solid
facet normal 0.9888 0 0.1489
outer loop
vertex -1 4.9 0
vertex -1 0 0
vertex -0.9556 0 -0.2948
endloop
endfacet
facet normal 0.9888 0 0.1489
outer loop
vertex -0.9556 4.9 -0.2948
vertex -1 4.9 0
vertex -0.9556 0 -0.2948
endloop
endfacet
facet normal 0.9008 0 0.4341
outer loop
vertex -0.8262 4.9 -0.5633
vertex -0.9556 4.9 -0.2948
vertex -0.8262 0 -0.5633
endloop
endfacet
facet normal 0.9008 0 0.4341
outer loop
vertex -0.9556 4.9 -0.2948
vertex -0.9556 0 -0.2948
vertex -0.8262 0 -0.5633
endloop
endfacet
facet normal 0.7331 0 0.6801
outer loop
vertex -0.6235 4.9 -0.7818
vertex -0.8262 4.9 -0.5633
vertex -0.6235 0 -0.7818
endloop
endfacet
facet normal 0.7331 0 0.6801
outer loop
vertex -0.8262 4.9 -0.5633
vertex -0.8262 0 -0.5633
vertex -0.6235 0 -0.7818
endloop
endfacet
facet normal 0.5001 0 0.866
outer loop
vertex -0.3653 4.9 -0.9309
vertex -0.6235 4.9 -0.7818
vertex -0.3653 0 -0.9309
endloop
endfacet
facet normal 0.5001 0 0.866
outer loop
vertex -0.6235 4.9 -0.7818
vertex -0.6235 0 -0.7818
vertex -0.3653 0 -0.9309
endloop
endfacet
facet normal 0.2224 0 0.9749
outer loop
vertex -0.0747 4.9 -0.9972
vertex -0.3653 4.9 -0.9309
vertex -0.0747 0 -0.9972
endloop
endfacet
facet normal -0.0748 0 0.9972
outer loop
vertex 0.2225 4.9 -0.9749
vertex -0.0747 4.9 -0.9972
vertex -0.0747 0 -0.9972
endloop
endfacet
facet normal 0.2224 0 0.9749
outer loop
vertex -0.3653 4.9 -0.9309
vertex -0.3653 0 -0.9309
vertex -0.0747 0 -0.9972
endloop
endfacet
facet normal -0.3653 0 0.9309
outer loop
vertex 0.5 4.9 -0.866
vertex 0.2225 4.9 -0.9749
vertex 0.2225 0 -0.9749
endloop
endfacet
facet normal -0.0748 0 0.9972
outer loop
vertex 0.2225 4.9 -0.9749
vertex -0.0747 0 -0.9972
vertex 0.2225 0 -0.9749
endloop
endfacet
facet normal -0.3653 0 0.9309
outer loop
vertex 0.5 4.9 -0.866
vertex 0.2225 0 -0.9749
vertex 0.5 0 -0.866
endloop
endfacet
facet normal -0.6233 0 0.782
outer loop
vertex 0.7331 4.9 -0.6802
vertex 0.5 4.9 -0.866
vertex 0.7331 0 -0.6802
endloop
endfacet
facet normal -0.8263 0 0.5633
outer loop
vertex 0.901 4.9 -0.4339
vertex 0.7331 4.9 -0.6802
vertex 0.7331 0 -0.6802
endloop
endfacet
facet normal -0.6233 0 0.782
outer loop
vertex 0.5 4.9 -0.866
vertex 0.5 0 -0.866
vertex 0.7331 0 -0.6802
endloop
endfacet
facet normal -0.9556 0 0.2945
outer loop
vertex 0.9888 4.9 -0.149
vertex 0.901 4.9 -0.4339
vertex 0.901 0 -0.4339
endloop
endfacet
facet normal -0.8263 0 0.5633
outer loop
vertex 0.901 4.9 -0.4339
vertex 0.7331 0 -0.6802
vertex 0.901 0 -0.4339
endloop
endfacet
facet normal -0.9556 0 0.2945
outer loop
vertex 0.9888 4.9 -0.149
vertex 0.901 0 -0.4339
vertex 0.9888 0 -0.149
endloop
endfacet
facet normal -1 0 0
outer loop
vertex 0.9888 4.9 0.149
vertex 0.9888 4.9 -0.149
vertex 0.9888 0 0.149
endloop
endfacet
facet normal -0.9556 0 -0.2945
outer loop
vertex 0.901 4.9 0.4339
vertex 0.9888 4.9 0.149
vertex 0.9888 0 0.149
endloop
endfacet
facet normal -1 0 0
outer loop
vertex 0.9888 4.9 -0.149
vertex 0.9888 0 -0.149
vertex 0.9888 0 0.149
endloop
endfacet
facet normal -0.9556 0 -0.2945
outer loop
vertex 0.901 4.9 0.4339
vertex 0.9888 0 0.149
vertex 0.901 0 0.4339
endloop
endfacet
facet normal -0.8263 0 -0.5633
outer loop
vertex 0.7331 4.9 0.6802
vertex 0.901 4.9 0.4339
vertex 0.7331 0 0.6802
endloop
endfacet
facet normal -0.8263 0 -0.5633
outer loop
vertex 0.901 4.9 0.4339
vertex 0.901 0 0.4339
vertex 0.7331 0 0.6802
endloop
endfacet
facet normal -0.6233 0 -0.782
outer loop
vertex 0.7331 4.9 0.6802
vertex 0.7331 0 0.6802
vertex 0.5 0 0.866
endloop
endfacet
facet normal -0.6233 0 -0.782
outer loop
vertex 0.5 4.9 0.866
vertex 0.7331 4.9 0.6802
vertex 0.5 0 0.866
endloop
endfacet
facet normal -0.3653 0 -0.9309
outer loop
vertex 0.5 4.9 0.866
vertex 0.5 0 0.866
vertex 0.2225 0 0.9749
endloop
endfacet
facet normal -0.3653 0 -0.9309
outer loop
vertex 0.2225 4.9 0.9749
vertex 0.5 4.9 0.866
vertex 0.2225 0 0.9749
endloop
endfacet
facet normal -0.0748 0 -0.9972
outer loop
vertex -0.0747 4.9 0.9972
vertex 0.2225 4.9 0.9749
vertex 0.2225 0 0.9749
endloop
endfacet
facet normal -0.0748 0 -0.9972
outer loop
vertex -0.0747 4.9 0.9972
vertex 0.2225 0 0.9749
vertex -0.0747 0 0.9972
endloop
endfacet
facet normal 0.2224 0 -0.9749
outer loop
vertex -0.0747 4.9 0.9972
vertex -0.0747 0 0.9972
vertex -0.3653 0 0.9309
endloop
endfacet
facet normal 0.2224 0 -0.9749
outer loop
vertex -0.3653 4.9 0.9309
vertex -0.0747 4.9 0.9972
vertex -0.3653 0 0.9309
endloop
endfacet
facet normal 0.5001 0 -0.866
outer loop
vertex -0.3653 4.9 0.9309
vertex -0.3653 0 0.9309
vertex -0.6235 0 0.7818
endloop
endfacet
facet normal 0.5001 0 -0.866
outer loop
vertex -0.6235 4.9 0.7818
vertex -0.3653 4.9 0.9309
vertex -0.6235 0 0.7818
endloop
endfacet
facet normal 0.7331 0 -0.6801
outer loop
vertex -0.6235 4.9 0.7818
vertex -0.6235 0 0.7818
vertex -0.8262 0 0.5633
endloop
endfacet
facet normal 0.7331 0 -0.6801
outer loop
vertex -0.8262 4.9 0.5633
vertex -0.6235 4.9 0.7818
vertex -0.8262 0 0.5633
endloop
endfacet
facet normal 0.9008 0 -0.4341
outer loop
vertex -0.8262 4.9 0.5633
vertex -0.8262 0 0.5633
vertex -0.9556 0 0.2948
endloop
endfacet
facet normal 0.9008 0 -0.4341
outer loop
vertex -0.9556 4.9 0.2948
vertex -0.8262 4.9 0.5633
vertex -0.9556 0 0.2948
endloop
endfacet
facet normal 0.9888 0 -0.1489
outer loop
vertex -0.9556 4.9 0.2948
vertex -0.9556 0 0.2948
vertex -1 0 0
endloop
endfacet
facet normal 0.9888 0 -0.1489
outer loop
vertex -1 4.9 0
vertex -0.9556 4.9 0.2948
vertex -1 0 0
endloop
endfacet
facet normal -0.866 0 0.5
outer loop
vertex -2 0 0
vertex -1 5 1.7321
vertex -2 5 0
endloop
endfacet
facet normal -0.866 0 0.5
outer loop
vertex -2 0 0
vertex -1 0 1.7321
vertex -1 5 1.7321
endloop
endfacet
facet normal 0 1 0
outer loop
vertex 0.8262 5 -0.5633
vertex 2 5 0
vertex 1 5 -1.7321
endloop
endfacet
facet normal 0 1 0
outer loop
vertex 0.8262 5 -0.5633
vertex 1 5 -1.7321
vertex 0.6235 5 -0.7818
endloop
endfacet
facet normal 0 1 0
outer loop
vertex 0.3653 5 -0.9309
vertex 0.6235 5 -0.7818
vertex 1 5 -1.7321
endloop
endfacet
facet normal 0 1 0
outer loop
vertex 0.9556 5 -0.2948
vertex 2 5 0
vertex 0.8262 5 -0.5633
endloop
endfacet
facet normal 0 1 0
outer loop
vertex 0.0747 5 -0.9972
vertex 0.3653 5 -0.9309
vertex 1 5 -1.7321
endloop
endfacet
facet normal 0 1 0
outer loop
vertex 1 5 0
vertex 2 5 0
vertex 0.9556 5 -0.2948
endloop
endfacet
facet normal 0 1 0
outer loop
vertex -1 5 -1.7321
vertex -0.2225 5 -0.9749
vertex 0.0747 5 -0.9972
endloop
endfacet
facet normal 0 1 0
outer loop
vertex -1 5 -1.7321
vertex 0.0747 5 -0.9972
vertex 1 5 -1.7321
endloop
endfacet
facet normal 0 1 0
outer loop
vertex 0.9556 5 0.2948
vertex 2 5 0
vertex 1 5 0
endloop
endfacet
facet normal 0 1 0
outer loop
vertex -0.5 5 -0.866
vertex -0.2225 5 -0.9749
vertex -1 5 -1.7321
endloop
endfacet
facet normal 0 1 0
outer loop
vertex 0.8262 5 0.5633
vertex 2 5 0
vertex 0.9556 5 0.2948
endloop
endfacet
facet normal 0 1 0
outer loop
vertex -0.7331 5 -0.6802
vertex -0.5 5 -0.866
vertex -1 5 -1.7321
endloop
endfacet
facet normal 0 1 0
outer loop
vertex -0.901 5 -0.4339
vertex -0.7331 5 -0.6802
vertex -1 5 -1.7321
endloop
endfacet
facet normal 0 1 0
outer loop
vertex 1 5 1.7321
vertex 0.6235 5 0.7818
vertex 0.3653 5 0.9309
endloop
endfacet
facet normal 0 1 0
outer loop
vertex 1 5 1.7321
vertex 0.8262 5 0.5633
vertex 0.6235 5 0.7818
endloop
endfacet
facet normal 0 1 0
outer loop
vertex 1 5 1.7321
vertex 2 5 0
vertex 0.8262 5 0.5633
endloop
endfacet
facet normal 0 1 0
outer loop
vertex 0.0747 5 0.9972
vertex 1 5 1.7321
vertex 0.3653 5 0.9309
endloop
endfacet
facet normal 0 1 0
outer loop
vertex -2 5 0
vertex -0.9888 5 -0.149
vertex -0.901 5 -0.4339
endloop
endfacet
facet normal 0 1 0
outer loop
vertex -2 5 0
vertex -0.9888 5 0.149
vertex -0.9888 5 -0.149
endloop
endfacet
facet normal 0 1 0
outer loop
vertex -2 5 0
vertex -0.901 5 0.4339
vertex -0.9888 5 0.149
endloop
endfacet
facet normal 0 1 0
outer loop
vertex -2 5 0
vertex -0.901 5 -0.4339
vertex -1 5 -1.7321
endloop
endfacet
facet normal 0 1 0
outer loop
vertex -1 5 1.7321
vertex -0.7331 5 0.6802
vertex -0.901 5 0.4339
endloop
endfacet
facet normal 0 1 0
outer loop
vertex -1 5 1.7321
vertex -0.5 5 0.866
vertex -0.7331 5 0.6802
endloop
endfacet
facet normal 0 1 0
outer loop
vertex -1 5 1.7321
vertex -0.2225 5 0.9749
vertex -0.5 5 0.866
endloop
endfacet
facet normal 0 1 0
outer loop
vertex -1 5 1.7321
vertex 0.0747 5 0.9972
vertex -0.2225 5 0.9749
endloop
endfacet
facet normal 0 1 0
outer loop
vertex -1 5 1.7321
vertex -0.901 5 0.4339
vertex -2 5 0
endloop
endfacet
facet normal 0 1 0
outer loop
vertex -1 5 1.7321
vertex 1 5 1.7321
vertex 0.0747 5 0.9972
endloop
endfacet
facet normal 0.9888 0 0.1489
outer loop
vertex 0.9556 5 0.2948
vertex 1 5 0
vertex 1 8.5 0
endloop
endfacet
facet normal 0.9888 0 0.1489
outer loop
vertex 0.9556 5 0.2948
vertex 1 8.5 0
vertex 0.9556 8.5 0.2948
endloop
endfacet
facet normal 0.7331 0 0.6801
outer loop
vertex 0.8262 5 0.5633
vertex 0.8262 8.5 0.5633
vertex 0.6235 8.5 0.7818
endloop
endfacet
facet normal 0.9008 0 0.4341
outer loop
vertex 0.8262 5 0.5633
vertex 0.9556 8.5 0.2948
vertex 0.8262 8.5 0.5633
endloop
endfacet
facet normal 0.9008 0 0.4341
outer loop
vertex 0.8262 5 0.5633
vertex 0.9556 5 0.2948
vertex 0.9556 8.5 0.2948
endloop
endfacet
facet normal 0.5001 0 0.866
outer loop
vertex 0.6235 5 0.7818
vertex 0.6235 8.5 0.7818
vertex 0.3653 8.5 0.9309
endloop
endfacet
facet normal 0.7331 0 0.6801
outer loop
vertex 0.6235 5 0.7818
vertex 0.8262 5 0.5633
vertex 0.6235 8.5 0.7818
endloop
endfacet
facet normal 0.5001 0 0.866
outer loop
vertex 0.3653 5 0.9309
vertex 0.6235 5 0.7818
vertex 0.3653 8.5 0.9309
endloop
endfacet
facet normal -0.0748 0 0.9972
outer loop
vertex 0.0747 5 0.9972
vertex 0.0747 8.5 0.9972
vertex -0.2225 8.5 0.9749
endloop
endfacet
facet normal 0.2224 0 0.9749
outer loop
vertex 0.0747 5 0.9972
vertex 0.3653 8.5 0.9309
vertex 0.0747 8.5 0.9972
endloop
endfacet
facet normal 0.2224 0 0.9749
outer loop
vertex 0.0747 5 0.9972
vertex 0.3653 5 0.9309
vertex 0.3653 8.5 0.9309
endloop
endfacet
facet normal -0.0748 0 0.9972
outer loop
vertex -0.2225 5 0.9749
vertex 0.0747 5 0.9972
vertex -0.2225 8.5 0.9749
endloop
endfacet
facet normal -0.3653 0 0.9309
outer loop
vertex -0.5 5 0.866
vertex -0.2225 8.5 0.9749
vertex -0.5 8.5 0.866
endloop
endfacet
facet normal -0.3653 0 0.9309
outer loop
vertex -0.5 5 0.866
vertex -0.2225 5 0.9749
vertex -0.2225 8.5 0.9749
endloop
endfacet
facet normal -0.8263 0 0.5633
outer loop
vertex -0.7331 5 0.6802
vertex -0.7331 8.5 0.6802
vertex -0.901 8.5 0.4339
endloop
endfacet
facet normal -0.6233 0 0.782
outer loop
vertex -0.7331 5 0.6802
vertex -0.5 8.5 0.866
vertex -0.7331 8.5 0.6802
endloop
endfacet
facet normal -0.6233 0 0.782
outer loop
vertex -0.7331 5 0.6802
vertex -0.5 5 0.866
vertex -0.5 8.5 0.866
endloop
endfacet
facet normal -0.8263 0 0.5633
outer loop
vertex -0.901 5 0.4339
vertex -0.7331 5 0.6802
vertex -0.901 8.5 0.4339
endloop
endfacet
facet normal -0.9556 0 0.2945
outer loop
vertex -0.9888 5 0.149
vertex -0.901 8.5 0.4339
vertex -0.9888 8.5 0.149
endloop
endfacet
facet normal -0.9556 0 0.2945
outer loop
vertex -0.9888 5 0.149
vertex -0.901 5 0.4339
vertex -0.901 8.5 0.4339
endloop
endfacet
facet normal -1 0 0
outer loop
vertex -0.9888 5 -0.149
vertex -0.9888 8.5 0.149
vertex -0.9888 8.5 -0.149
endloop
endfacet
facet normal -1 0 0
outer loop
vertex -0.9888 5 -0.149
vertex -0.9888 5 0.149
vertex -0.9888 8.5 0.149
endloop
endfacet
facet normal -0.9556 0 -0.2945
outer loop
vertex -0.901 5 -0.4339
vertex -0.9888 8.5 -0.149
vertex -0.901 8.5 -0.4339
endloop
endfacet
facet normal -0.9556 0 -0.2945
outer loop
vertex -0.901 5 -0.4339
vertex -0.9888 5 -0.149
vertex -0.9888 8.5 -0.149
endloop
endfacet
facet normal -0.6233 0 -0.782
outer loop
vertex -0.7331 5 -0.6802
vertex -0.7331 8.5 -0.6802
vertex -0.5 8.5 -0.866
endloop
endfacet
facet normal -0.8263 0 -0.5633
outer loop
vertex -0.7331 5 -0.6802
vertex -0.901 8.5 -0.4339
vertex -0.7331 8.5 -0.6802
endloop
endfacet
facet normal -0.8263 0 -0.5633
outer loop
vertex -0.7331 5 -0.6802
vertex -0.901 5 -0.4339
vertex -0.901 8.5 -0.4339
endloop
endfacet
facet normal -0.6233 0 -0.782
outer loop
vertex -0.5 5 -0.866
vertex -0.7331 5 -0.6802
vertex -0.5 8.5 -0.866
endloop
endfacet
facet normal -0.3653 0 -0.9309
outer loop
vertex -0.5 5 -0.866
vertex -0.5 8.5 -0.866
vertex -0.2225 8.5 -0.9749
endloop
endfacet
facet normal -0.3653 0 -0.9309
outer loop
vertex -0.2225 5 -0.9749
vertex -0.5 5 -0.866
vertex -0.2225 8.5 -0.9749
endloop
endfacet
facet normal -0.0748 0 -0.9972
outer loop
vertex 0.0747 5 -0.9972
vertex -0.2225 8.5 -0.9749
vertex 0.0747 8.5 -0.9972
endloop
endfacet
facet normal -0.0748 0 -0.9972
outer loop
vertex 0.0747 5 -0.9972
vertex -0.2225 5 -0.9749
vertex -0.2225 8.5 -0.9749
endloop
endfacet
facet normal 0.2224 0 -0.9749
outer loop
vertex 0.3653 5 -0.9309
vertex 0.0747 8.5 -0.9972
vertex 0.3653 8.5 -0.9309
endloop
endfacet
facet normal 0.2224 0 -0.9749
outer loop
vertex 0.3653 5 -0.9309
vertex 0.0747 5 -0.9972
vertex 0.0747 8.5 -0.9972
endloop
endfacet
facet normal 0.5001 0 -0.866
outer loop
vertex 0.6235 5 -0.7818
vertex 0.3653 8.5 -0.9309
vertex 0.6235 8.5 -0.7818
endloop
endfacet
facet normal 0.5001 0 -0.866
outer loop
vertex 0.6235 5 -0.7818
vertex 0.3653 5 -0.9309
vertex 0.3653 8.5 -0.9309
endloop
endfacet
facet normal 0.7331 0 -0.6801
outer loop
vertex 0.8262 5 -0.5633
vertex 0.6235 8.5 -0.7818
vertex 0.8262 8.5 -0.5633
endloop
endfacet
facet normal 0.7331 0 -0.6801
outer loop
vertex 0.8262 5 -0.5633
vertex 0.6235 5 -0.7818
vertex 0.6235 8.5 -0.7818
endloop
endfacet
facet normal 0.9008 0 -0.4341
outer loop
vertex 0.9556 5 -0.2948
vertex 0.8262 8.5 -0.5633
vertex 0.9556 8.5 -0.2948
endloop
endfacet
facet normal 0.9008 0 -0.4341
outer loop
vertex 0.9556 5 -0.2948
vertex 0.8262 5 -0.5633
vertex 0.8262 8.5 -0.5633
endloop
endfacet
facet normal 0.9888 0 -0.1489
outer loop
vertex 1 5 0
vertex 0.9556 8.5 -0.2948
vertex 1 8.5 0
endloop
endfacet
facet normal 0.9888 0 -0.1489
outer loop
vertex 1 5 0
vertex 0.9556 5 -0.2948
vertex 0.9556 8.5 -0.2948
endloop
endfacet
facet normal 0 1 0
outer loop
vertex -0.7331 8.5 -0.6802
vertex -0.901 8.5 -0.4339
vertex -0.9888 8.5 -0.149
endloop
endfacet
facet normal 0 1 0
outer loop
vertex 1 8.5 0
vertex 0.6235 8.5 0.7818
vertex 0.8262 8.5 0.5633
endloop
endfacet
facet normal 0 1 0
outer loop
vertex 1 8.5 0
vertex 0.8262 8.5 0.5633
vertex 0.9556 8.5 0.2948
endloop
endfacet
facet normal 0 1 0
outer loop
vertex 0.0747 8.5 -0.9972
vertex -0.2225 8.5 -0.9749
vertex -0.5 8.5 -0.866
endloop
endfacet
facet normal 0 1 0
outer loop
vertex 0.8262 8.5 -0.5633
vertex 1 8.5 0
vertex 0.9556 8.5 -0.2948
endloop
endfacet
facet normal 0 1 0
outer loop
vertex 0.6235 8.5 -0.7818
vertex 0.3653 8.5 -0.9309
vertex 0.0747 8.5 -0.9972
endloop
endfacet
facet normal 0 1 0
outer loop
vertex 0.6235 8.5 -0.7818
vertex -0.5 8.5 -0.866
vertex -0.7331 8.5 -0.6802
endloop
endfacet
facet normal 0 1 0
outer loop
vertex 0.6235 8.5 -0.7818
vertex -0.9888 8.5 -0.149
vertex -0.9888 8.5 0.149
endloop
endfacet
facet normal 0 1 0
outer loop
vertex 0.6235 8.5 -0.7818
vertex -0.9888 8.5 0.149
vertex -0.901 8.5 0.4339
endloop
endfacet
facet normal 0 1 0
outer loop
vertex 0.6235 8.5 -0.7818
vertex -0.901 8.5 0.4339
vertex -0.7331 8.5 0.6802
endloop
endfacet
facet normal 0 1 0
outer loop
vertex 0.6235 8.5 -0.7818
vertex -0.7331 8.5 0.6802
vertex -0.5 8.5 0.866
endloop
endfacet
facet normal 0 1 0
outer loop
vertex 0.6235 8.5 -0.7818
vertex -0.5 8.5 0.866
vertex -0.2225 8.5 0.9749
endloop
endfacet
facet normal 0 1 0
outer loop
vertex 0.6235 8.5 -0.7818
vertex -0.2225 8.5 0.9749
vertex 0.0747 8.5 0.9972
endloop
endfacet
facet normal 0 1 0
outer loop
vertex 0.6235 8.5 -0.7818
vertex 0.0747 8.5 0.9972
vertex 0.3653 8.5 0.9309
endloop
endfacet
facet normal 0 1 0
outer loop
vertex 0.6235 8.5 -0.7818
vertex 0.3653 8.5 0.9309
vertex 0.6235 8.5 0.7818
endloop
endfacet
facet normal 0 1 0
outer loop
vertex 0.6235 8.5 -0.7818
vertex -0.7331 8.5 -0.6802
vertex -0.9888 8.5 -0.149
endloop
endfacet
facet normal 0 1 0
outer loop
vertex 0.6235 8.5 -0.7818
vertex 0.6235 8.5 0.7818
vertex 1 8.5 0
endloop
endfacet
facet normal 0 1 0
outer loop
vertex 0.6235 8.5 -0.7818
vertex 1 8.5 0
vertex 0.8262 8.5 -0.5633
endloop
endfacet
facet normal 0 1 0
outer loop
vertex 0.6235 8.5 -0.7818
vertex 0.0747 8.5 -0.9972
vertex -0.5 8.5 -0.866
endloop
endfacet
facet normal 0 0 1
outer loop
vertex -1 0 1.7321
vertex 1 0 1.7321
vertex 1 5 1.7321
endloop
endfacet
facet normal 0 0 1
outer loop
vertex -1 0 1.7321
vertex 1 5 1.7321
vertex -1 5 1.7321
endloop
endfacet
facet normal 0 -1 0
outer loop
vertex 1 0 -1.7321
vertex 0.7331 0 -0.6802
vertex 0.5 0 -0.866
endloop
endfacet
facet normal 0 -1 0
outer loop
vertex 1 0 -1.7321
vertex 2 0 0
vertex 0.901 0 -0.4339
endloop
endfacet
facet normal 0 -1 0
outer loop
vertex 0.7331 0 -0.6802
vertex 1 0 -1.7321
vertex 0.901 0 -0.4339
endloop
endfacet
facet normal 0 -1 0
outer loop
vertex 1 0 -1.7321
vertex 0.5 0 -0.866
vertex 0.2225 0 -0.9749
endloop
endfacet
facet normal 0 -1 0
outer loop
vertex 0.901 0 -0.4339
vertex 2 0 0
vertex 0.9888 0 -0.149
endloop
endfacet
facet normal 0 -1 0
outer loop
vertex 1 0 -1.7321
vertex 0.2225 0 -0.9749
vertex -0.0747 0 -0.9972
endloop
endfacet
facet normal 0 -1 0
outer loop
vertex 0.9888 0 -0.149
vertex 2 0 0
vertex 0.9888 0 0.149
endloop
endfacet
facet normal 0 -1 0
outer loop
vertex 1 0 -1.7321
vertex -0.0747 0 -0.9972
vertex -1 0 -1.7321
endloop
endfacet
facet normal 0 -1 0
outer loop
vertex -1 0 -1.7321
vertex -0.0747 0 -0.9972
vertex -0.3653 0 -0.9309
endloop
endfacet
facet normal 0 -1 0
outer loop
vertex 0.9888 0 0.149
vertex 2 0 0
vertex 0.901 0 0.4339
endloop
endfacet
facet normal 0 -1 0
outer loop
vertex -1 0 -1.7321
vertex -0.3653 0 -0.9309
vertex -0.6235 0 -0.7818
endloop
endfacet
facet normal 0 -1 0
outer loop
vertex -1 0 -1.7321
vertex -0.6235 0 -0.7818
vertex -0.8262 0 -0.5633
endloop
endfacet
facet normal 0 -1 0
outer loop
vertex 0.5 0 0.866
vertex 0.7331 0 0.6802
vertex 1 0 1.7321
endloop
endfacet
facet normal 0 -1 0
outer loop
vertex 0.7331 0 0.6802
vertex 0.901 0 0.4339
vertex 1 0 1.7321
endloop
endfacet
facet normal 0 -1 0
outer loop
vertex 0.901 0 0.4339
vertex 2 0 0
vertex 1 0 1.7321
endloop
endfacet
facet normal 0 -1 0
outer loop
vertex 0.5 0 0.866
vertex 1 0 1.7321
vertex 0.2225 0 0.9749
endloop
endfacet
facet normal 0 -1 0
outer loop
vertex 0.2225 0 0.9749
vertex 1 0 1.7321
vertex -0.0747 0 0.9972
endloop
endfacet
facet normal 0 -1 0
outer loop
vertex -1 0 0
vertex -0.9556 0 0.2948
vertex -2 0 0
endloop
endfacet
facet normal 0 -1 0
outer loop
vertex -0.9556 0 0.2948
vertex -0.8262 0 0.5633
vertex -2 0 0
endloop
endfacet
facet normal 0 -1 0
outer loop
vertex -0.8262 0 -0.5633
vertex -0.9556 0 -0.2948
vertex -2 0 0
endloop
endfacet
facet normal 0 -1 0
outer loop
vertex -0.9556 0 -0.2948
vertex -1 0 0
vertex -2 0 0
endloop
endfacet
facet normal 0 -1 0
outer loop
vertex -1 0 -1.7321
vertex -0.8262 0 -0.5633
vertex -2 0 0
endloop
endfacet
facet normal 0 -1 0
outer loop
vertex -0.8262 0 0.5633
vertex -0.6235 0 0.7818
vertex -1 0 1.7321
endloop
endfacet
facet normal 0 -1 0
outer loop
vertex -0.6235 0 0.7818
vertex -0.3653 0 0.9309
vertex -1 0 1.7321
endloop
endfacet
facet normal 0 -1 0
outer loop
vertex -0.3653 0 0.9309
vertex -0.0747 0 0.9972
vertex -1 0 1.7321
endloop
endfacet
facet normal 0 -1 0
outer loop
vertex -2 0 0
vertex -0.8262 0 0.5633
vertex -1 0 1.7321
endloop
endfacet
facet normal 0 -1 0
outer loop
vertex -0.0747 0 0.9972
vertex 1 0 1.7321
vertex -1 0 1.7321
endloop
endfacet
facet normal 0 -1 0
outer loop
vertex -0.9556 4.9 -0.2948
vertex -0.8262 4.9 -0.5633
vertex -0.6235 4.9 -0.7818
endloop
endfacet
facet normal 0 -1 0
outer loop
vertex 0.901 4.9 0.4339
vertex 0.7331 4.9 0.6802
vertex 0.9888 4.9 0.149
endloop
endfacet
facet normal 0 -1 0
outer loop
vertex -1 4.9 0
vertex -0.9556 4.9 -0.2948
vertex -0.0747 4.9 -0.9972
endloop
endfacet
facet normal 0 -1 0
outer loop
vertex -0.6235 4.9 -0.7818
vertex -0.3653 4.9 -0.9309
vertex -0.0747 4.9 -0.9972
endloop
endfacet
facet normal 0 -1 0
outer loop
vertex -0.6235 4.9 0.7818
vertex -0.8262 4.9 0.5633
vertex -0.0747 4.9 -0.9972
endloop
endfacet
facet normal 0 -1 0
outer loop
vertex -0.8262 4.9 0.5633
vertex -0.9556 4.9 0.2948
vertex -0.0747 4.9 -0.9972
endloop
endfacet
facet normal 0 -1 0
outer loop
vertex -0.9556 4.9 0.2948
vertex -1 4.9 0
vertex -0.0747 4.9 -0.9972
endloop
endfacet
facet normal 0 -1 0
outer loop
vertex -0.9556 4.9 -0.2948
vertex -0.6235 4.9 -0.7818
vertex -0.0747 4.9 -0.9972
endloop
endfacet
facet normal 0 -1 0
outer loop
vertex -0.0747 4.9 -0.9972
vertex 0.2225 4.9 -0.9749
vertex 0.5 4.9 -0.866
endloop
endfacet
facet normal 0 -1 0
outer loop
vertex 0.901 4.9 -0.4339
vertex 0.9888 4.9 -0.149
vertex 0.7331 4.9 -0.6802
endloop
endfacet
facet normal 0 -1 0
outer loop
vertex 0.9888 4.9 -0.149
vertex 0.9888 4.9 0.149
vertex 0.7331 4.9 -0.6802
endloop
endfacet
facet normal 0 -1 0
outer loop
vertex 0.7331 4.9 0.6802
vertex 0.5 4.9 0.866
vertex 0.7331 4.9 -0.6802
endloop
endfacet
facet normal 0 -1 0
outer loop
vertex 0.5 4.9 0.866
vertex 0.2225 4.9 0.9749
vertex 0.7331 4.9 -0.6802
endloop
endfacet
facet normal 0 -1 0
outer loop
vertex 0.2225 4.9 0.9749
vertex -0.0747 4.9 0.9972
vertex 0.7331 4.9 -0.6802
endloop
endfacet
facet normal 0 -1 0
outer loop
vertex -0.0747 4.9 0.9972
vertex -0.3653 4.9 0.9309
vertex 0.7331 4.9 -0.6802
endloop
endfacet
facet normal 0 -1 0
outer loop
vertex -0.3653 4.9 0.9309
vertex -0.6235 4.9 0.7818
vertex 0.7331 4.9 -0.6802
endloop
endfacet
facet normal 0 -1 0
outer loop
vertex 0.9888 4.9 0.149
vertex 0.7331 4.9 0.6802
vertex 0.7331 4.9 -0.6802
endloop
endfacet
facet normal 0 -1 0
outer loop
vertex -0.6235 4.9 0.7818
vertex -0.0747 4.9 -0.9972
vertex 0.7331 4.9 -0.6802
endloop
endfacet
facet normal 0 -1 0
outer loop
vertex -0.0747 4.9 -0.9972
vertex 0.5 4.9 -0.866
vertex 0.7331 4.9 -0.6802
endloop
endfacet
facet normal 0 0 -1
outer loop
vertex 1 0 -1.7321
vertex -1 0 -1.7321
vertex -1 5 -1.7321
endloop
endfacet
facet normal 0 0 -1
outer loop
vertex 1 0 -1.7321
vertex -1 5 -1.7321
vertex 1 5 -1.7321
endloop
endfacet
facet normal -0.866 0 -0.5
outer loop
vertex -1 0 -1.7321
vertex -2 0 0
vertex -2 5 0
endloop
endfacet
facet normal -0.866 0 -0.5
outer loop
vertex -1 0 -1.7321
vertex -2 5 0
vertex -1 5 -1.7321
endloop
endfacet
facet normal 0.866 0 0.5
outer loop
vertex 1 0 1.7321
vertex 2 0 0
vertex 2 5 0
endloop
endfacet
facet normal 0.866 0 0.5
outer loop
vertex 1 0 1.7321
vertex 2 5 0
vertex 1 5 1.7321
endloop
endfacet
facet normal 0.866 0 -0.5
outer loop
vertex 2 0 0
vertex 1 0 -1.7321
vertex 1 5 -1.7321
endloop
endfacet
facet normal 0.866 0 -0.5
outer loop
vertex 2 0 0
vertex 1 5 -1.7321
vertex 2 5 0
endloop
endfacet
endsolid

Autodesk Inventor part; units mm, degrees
ref_plane "YZ Plane" through (0, 0, 0) normal (1, 0, 0) x (0, 1, 0)
ref_plane "XZ Plane" through (0, 0, 0) normal (0, 1, 0) x (-1, 0, 0)
ref_plane "XY Plane" through (0, 0, 0) normal (0, 0, 1) x (1, 0, 0)
sketch "Sketch1" plane through (0, 0, 0) normal (0, 1, 0) x (-1, 0, 0)
  line L0 (2, 0) -> (1, -1.7321)
  line L1 (1, -1.7321) -> (-1, -1.7321)
  line L2 (-1, -1.7321) -> (-2, 0)
  line L3 (-2, 0) -> (-1, 1.7321)
  line L4 (-1, 1.7321) -> (1, 1.7321)
  line L5 (1, 1.7321) -> (2, 0)
  circle A0 centre (0, 0) radius 1
extrude "Extrusion1" add sketch "Sketch1" along normal blind 5
sketch "Sketch2" plane through (0, 5, 0) normal (0, 1, 0) x (1, 0, 0)
  line L0 (-2, 0) -> (-1, 1.7321)
  line L1 (-1, 1.7321) -> (1, 1.7321)
  line L2 (1, 1.7321) -> (2, 0)
  line L3 (2, 0) -> (1, -1.7321)
  line L4 (1, -1.7321) -> (-1, -1.7321)
  line L5 (-1, -1.7321) -> (-2, 0)
  point P0 (0, 0)
  point P1 (0, 0)
extrude "Extrusion2" add sketch "Sketch2" against normal blind 0.1
sketch "Sketch3" plane through (0, 5, 0) normal (0, 1, 0) x (1, 0, 0)
  circle A0 centre (0, 0) radius 1
  dimension "d5" = 2
extrude "Extrusion3" add sketch "Sketch3" along normal blind 3.5
properties part number "Standoff"
